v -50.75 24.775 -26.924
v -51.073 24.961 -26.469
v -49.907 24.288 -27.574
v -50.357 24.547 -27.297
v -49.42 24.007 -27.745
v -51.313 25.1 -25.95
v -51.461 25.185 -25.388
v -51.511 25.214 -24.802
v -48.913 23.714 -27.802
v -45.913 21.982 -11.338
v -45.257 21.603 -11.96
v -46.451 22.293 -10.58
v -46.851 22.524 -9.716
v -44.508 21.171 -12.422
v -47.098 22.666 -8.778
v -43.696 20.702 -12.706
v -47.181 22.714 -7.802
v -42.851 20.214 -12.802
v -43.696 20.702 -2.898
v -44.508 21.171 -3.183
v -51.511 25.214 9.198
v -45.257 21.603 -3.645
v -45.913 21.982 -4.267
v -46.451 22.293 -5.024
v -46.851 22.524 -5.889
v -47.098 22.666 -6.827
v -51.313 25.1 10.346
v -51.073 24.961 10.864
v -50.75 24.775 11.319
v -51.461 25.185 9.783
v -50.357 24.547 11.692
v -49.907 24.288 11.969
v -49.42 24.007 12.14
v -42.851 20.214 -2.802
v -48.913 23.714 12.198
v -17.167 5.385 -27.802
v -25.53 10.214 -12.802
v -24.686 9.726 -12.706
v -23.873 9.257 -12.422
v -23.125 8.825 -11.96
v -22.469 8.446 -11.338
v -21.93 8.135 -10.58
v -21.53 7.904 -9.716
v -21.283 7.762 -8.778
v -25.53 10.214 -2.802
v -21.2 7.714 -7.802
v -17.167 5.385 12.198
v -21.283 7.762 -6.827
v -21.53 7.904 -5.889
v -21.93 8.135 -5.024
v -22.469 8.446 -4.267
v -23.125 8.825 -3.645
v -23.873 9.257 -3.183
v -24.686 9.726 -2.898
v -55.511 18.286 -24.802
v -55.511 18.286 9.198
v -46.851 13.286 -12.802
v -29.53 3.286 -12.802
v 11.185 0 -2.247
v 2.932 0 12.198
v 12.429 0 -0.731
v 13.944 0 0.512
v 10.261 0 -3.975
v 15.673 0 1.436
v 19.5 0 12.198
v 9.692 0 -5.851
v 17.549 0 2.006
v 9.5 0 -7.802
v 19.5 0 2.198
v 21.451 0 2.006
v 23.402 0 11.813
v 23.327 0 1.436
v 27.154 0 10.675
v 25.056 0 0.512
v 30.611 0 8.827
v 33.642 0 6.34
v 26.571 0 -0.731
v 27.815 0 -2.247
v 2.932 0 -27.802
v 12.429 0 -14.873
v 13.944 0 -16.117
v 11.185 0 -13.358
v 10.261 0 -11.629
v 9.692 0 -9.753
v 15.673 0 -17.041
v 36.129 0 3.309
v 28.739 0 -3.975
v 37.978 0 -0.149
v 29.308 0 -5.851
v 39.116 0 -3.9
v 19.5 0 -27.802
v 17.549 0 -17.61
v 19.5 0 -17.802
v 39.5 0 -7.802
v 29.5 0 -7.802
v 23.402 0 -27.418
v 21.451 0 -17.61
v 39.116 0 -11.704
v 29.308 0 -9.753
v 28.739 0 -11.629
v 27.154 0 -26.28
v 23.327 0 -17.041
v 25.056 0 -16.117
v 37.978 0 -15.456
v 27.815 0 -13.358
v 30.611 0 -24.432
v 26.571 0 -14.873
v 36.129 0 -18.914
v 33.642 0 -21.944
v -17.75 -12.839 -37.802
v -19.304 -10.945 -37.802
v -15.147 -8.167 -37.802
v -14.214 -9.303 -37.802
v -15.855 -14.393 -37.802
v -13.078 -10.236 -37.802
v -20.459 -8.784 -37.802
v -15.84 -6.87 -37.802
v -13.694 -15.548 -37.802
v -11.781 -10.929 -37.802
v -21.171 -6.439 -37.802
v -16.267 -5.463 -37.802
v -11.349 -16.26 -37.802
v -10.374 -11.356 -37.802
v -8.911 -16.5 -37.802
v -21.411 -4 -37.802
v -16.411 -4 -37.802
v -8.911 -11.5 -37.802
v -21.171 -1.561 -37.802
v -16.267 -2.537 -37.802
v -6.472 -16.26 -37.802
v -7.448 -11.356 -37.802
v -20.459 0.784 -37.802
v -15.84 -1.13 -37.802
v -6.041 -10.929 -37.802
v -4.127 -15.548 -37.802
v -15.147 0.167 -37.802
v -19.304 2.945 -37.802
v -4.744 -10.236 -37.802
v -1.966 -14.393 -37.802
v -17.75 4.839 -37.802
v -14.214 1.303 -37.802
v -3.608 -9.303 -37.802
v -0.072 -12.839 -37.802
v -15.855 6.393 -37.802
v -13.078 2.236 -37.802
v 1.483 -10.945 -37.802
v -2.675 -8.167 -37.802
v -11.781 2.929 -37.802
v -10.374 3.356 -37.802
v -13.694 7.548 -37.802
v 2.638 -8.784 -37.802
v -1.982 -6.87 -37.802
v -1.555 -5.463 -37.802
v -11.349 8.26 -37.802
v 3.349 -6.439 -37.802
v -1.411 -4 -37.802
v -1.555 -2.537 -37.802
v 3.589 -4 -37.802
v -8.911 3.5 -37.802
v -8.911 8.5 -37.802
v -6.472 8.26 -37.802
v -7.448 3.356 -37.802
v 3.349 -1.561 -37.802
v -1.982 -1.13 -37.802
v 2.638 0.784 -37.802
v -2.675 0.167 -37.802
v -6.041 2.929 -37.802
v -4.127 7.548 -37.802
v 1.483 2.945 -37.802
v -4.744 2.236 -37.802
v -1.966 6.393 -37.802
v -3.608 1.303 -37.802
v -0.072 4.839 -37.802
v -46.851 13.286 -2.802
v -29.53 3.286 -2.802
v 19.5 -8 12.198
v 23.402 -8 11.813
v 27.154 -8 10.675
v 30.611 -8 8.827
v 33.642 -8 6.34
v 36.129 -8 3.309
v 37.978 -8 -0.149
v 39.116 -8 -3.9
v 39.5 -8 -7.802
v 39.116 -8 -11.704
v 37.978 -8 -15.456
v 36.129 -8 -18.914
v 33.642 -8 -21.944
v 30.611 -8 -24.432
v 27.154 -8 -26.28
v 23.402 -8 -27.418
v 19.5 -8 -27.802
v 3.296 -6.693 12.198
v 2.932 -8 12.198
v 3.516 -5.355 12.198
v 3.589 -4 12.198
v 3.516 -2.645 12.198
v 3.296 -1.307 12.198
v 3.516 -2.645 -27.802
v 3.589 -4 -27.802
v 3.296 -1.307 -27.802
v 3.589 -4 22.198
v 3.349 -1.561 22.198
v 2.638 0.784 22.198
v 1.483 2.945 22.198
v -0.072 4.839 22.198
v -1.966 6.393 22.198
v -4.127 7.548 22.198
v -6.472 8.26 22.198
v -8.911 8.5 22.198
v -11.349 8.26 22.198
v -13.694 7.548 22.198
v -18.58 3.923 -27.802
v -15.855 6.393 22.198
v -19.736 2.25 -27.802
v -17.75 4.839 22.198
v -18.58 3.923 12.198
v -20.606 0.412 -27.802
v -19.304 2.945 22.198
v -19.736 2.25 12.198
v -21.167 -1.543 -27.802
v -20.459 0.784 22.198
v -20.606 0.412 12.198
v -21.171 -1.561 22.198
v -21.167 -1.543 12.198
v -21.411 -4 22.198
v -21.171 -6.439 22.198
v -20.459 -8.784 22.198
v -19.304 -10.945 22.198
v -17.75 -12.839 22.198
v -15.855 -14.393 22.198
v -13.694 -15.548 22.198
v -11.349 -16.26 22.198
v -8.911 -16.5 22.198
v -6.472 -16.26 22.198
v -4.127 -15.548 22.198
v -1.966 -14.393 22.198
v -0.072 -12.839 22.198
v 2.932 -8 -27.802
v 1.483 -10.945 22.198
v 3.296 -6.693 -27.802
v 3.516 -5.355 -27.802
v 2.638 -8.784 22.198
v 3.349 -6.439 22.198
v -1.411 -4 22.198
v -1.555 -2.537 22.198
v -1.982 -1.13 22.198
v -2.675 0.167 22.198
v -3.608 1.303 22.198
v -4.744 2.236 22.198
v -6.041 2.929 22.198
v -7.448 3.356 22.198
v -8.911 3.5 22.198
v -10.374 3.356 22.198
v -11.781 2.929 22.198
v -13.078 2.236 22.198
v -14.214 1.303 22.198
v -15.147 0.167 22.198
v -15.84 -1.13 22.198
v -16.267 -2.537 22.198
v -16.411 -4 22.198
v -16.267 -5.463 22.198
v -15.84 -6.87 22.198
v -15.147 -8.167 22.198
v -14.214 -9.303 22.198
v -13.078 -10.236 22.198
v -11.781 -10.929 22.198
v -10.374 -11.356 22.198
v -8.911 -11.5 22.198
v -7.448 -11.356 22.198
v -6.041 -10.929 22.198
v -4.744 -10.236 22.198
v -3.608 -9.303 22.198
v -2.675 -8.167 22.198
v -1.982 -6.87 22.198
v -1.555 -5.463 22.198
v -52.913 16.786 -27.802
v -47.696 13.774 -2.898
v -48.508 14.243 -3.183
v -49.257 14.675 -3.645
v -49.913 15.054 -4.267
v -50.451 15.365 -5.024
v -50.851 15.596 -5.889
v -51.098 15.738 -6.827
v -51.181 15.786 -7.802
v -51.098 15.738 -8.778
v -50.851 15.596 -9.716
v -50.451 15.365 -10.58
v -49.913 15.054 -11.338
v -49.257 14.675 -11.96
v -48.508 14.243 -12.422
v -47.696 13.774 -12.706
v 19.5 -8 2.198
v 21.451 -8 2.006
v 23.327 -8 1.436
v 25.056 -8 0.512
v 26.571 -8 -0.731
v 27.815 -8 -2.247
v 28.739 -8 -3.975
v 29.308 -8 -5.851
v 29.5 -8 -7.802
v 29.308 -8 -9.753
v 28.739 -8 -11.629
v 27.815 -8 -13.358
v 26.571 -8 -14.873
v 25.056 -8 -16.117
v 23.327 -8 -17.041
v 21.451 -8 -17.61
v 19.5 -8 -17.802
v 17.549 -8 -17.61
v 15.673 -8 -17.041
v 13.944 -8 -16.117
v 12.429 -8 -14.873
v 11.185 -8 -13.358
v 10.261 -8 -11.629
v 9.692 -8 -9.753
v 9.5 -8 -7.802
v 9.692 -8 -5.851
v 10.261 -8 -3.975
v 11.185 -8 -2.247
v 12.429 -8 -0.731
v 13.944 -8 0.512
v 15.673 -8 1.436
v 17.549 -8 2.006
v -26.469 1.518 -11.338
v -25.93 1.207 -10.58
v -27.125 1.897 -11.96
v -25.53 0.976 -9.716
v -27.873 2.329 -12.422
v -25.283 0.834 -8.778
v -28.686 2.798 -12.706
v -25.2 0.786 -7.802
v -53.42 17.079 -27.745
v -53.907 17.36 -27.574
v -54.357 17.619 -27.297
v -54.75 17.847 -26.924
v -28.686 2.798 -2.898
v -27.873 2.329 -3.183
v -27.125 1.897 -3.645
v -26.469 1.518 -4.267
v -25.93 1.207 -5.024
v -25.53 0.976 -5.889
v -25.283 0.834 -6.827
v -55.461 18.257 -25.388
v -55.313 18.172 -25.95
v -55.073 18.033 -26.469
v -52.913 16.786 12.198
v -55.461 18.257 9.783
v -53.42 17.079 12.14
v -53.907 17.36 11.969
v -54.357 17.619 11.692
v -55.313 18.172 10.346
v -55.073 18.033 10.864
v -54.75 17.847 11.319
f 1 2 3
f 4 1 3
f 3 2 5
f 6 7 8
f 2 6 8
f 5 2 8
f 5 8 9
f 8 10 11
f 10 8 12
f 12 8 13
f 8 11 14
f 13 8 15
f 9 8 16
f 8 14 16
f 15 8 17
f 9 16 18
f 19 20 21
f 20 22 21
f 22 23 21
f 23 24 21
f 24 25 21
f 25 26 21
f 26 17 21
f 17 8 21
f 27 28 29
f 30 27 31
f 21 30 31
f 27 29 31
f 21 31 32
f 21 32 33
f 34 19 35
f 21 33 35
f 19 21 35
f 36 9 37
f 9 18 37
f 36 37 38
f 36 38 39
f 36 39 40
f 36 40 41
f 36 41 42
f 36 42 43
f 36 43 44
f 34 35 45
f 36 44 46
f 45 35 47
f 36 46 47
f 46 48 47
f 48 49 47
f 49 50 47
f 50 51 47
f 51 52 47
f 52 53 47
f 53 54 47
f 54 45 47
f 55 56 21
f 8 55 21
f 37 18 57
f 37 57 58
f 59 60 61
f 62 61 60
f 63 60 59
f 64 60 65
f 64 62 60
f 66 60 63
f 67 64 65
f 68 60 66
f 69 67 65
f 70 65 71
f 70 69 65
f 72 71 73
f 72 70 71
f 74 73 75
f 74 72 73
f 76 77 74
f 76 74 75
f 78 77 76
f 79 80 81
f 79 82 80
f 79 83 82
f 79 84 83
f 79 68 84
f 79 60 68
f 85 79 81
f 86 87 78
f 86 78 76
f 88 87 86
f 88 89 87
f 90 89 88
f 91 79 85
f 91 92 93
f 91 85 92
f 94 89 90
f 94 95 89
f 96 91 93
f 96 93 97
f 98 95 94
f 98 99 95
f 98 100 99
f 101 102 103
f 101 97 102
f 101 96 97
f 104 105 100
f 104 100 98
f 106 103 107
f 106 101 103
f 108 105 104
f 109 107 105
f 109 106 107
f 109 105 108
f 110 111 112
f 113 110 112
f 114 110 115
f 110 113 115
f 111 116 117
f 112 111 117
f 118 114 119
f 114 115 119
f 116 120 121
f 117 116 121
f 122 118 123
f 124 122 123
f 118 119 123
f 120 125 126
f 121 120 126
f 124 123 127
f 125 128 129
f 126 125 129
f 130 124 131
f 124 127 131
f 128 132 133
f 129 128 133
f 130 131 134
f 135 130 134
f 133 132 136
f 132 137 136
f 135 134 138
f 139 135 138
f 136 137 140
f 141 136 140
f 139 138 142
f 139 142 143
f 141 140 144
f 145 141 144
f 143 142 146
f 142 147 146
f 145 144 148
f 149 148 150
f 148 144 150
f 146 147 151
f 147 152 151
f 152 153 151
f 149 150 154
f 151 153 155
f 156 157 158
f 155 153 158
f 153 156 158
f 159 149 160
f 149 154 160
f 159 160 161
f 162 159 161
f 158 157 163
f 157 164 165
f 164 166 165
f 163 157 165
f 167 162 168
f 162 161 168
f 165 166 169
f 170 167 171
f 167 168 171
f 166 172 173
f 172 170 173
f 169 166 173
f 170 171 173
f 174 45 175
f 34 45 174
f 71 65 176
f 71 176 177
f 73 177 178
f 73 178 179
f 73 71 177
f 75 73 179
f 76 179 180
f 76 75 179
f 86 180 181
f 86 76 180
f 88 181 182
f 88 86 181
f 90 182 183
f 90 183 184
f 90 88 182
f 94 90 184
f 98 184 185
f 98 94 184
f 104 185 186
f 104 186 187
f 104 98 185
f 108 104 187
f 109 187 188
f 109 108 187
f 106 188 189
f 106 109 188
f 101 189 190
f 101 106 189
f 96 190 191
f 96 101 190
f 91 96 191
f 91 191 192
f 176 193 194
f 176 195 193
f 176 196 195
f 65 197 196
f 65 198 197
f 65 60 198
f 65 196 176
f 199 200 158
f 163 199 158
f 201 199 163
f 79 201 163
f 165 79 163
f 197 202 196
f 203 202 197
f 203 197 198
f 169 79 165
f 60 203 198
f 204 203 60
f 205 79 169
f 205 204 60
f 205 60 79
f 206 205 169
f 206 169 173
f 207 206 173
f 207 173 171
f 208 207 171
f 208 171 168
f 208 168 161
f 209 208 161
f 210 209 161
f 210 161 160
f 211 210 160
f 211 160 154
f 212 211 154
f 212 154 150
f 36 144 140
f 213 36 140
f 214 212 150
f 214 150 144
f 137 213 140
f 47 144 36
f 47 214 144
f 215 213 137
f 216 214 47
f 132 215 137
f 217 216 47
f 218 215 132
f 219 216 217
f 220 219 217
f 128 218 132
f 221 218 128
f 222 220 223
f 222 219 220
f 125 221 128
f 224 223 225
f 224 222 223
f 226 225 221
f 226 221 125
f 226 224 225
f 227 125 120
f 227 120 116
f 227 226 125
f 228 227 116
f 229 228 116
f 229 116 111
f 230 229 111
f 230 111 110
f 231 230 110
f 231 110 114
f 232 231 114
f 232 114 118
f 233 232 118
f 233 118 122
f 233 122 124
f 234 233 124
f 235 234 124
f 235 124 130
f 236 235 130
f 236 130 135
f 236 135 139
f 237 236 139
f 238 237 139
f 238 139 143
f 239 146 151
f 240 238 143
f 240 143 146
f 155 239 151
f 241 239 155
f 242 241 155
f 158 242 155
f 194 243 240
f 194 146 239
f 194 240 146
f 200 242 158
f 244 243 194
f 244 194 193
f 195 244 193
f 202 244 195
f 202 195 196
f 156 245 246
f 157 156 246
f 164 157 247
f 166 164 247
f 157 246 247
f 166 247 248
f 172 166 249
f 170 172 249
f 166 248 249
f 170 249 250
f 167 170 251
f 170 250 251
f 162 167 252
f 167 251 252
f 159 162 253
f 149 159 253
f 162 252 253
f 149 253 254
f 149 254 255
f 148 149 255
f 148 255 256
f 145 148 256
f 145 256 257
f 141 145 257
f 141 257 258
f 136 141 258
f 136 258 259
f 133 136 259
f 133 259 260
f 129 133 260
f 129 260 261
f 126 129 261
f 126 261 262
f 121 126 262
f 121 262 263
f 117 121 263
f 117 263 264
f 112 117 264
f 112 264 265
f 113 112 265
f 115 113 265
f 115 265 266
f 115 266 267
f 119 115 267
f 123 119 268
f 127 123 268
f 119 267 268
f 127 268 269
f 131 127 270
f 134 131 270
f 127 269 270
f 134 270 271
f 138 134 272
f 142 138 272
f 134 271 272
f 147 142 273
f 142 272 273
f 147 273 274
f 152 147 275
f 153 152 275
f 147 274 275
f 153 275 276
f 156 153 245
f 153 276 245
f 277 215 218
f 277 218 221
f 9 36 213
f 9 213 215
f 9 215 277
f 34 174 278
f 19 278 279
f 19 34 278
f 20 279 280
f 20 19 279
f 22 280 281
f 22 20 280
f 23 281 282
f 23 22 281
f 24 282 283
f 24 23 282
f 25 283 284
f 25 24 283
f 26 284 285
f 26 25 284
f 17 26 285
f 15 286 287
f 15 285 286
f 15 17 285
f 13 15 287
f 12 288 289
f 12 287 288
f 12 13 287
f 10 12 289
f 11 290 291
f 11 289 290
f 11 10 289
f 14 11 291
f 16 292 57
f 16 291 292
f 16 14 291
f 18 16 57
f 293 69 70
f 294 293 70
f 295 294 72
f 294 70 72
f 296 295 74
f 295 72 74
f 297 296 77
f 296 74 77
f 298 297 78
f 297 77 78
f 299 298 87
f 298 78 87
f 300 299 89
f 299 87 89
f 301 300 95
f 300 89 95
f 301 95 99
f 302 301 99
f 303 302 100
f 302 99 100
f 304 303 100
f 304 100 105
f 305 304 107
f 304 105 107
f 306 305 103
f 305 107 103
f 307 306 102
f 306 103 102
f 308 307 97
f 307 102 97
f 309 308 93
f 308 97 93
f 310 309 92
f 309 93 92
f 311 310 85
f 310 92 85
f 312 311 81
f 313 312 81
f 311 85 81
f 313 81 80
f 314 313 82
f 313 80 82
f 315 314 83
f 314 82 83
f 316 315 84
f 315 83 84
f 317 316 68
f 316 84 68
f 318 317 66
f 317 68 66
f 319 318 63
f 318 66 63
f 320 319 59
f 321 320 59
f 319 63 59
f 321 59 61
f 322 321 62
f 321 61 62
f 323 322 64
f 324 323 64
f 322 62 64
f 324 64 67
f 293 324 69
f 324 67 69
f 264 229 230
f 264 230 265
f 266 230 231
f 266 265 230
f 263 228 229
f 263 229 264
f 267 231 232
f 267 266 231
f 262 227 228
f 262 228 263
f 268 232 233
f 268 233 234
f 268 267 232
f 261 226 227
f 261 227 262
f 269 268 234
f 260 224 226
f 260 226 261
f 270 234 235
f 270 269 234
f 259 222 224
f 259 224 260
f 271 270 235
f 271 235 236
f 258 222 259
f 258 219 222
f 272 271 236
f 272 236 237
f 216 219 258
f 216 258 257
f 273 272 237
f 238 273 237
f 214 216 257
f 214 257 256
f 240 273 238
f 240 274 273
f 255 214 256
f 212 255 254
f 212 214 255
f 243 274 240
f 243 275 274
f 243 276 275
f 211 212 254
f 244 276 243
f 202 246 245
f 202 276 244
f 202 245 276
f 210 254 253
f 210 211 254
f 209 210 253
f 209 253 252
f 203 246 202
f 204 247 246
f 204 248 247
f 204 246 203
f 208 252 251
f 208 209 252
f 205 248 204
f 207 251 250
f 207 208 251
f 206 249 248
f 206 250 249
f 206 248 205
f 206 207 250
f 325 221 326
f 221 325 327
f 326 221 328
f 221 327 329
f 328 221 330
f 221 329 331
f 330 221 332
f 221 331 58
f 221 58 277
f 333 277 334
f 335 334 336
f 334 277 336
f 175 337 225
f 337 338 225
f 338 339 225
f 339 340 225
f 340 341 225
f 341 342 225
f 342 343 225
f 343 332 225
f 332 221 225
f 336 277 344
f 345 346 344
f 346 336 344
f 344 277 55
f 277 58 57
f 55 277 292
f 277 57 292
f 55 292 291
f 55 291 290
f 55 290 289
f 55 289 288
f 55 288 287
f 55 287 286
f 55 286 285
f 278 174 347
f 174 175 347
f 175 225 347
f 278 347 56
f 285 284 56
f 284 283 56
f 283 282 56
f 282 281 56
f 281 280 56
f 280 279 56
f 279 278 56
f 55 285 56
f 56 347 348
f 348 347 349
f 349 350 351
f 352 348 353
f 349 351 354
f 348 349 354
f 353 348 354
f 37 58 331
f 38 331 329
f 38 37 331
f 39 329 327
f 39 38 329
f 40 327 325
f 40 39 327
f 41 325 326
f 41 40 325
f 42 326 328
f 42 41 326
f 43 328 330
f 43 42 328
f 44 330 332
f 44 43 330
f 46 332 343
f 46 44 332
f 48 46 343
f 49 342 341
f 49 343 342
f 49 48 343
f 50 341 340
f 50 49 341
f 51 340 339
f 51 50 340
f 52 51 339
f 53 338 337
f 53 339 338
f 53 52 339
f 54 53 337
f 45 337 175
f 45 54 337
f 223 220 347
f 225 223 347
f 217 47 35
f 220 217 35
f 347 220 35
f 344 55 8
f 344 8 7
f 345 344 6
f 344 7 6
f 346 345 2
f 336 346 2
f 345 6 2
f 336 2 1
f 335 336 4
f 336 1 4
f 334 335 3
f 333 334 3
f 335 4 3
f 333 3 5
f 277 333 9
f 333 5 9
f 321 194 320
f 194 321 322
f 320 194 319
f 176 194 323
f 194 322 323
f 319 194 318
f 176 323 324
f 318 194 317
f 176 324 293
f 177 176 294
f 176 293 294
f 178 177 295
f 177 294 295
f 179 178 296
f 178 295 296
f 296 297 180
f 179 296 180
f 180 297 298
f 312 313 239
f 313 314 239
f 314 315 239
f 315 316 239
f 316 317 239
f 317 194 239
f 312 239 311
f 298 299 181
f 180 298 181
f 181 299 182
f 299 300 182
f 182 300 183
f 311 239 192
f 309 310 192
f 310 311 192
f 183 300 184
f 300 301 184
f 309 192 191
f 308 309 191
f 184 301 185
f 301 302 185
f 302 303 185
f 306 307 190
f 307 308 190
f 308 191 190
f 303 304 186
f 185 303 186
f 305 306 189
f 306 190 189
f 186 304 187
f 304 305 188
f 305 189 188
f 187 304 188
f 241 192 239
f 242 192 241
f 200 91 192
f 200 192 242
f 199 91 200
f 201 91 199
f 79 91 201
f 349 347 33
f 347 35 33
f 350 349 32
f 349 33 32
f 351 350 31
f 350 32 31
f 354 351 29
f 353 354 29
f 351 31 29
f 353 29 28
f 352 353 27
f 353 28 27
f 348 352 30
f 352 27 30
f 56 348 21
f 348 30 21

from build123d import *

# Parameters (mm, degrees)
SKETCH2_R           = 10
BOSS_EXTRUDE1_DEPTH = 8
SKETCH3_R           = 12.5
SKETCH3_R_2         = 7.5
BOSS_EXTRUDE2_DEPTH = 50
BOSS_EXTRUDE3_START = 10
SKETCH4_R           = 12.5
SKETCH4_R_2         = 7.5
BOSS_EXTRUDE3_DEPTH = 10
BOSS_EXTRUDE4_DEPTH = 40
CUT_EXTRUDE1_DEPTH  = 72.52071964
FILLET1_R           = 3


with BuildPart() as part:
    # Sketch2 → Boss-Extrude1 (new body)
    with BuildSketch(Plane(origin=(0, 0, 0), x_dir=(1, 0, 0), z_dir=(0, 1, 0))):
        with BuildLine():
            Line((0, 27.802301255), (0, -12.197698745))
            Line((0, -12.197698745), (19.5, -12.197698745))
            ThreePointArc((19.5, -12.197698745), (39.5, 7.802301255), (19.5, 27.802301255))
            Line((19.5, 27.802301255), (0, 27.802301255))
        make_face()
        with Locations(Location((19.5, 7.802301255, 0), (0, 0, 270))):
            Circle(SKETCH2_R, mode=Mode.SUBTRACT)
    extrude(amount=-BOSS_EXTRUDE1_DEPTH)

    # Sketch3 → Boss-Extrude2 (add)
    with BuildSketch(Plane.XY.offset(12.197698745)):
        with Locations((-8.910855114, -4)):
            Circle(SKETCH3_R)
        with Locations((-8.910855114, -4)):
            Circle(SKETCH3_R_2, mode=Mode.SUBTRACT)
    extrude(amount=-BOSS_EXTRUDE2_DEPTH)

    # Sketch4 → Boss-Extrude3 (add)
    with BuildSketch(Plane.XY.offset(12.197698745).offset(BOSS_EXTRUDE3_START)):
        with Locations((-8.910855114, -4)):
            Circle(SKETCH4_R)
        with Locations((-8.910855114, -4)):
            Circle(SKETCH4_R_2, mode=Mode.SUBTRACT)
    extrude(amount=-BOSS_EXTRUDE3_DEPTH)

    # Sketch6 → Boss-Extrude4 (add)
    with BuildSketch(Plane.XY.offset(12.197698745)):
        Polygon((-18.032516938, -3.352408244), (-55.511163409, 18.285898385), (-51.511163409, 25.214101615), (-14.032516938, 3.575794986), align=None)
    extrude(amount=-BOSS_EXTRUDE4_DEPTH)

    # Sketch7 → Cut-Extrude1 (cut, through all)
    with BuildSketch(Plane(origin=(-1.959764586, -3.394411834, 0), x_dir=(0.866025403784438, -0.500000000000001, 0), z_dir=(0.500000000000001, 0.866025403784438, 0))):
        with BuildLine():
            Line((-47.217026898, 12.802301255), (-27.217026898, 12.802301255))
            ThreePointArc((-27.217026898, 12.802301255), (-22.217026898, 7.802301255), (-27.217026898, 2.802301255))
            Line((-27.217026898, 2.802301255), (-47.217026898, 2.802301255))
            ThreePointArc((-47.217026898, 2.802301255), (-52.217026898, 7.802301255), (-47.217026898, 12.802301255))
        make_face()
    extrude(amount=-CUT_EXTRUDE1_DEPTH, mode=Mode.SUBTRACT)

    # Fillet1
    fillet1_edges = [part.edges().sort_by_distance(p)[0] for p in [
        (-53.511163409, 21.75, -27.802301255),
        (-53.511163409, 21.75, 12.197698745),
    ]]
    fillet(fillet1_edges, radius=FILLET1_R)


solid = part.part
